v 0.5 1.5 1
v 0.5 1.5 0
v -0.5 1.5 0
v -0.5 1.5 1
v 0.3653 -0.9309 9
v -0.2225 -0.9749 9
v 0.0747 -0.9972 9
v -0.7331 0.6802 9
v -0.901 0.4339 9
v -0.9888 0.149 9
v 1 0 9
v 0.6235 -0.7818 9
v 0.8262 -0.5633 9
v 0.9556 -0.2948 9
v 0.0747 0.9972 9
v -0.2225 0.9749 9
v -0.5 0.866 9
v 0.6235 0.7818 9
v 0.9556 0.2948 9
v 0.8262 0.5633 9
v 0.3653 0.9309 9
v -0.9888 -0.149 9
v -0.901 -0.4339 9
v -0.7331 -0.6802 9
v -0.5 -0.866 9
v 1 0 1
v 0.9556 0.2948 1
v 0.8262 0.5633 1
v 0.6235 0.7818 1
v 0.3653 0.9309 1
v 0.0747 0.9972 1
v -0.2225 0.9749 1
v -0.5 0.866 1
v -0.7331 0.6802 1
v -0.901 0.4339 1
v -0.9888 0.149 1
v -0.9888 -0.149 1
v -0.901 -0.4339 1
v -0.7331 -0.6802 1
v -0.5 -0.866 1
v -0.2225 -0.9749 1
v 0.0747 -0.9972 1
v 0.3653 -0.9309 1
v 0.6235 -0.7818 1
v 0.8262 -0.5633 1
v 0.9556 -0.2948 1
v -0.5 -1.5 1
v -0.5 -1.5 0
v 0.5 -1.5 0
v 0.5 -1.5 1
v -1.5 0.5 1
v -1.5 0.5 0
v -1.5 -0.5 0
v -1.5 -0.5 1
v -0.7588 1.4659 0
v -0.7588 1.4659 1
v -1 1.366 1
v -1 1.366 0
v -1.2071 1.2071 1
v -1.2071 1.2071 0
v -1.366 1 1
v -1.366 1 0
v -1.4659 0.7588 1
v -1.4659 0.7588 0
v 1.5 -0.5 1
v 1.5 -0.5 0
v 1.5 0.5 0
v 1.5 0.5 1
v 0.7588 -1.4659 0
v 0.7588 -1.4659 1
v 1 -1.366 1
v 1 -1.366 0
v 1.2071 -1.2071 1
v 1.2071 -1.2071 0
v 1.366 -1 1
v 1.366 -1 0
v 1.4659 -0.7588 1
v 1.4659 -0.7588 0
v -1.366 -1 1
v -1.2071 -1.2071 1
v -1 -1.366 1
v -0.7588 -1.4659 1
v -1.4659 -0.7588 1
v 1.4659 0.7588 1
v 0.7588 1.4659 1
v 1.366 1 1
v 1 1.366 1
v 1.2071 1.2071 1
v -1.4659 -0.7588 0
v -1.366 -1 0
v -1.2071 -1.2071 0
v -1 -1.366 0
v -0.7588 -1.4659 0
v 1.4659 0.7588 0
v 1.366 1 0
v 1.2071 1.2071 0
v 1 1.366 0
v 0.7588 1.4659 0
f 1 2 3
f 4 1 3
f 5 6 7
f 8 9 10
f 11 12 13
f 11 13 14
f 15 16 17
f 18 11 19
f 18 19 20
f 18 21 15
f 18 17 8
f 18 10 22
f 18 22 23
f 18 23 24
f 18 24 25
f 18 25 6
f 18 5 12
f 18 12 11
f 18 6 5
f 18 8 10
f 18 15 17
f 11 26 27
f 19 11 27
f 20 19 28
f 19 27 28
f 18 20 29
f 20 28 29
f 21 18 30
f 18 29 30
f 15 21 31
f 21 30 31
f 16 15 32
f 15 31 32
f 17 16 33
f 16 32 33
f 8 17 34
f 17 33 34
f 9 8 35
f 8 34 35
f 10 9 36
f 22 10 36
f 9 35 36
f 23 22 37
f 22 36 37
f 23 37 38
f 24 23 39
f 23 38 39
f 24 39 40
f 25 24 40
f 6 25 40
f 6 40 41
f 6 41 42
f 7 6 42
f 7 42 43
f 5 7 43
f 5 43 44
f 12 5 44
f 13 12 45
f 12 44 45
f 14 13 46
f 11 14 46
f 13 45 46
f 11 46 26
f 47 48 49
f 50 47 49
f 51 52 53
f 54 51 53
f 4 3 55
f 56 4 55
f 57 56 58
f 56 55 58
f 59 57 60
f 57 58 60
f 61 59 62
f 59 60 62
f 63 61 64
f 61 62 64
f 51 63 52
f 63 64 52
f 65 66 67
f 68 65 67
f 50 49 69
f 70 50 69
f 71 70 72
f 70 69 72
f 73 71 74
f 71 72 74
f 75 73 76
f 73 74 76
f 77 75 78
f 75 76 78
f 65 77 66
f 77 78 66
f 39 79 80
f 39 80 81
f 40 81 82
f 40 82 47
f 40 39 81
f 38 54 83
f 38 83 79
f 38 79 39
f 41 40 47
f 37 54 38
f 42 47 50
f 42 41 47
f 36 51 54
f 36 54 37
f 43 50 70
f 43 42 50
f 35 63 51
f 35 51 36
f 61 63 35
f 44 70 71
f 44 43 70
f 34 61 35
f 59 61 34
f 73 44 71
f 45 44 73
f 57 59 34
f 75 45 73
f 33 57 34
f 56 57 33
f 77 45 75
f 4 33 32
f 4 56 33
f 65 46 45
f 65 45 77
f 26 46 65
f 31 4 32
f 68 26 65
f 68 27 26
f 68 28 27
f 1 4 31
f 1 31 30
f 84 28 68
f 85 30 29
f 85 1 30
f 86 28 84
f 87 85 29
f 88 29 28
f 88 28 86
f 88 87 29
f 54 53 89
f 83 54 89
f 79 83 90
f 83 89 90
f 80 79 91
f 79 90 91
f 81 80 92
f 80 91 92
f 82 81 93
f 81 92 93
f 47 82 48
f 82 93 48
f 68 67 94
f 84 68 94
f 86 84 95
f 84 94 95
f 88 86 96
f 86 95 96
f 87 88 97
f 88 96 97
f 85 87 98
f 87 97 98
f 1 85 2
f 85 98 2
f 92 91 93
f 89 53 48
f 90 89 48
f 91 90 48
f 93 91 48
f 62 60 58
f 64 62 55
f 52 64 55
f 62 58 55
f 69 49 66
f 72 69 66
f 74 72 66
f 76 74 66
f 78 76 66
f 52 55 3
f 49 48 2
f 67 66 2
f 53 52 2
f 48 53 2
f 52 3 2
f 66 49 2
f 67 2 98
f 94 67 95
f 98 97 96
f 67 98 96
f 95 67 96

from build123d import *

# Parameters (mm, degrees)
BOSS_EXTRUDE2_DEPTH = 1
SKETCH2_R           = 1
BOSS_EXTRUDE3_DEPTH = 8


with BuildPart() as part:
    # Sketch1 → Boss-Extrude2 (new body)
    with BuildSketch(Plane.XY):
        with BuildLine():
            Line((-0.5, -1.5), (0.5, -1.5))
            ThreePointArc((0.5, -1.5), (1.207106781, -1.207106781), (1.5, -0.5))
            Line((1.5, -0.5), (1.5, 0.5))
            ThreePointArc((1.5, 0.5), (1.207106781, 1.207106781), (0.5, 1.5))
            Line((0.5, 1.5), (-0.5, 1.5))
            ThreePointArc((-0.5, 1.5), (-1.207106781, 1.207106781), (-1.5, 0.5))
            Line((-1.5, 0.5), (-1.5, -0.5))
            ThreePointArc((-1.5, -0.5), (-1.207106781, -1.207106781), (-0.5, -1.5))
        make_face()
    extrude(amount=BOSS_EXTRUDE2_DEPTH)

    # Sketch2 → Boss-Extrude3 (add)
    with BuildSketch(Plane.XY.offset(1)):
        Circle(SKETCH2_R)
    extrude(amount=BOSS_EXTRUDE3_DEPTH)


solid = part.part
